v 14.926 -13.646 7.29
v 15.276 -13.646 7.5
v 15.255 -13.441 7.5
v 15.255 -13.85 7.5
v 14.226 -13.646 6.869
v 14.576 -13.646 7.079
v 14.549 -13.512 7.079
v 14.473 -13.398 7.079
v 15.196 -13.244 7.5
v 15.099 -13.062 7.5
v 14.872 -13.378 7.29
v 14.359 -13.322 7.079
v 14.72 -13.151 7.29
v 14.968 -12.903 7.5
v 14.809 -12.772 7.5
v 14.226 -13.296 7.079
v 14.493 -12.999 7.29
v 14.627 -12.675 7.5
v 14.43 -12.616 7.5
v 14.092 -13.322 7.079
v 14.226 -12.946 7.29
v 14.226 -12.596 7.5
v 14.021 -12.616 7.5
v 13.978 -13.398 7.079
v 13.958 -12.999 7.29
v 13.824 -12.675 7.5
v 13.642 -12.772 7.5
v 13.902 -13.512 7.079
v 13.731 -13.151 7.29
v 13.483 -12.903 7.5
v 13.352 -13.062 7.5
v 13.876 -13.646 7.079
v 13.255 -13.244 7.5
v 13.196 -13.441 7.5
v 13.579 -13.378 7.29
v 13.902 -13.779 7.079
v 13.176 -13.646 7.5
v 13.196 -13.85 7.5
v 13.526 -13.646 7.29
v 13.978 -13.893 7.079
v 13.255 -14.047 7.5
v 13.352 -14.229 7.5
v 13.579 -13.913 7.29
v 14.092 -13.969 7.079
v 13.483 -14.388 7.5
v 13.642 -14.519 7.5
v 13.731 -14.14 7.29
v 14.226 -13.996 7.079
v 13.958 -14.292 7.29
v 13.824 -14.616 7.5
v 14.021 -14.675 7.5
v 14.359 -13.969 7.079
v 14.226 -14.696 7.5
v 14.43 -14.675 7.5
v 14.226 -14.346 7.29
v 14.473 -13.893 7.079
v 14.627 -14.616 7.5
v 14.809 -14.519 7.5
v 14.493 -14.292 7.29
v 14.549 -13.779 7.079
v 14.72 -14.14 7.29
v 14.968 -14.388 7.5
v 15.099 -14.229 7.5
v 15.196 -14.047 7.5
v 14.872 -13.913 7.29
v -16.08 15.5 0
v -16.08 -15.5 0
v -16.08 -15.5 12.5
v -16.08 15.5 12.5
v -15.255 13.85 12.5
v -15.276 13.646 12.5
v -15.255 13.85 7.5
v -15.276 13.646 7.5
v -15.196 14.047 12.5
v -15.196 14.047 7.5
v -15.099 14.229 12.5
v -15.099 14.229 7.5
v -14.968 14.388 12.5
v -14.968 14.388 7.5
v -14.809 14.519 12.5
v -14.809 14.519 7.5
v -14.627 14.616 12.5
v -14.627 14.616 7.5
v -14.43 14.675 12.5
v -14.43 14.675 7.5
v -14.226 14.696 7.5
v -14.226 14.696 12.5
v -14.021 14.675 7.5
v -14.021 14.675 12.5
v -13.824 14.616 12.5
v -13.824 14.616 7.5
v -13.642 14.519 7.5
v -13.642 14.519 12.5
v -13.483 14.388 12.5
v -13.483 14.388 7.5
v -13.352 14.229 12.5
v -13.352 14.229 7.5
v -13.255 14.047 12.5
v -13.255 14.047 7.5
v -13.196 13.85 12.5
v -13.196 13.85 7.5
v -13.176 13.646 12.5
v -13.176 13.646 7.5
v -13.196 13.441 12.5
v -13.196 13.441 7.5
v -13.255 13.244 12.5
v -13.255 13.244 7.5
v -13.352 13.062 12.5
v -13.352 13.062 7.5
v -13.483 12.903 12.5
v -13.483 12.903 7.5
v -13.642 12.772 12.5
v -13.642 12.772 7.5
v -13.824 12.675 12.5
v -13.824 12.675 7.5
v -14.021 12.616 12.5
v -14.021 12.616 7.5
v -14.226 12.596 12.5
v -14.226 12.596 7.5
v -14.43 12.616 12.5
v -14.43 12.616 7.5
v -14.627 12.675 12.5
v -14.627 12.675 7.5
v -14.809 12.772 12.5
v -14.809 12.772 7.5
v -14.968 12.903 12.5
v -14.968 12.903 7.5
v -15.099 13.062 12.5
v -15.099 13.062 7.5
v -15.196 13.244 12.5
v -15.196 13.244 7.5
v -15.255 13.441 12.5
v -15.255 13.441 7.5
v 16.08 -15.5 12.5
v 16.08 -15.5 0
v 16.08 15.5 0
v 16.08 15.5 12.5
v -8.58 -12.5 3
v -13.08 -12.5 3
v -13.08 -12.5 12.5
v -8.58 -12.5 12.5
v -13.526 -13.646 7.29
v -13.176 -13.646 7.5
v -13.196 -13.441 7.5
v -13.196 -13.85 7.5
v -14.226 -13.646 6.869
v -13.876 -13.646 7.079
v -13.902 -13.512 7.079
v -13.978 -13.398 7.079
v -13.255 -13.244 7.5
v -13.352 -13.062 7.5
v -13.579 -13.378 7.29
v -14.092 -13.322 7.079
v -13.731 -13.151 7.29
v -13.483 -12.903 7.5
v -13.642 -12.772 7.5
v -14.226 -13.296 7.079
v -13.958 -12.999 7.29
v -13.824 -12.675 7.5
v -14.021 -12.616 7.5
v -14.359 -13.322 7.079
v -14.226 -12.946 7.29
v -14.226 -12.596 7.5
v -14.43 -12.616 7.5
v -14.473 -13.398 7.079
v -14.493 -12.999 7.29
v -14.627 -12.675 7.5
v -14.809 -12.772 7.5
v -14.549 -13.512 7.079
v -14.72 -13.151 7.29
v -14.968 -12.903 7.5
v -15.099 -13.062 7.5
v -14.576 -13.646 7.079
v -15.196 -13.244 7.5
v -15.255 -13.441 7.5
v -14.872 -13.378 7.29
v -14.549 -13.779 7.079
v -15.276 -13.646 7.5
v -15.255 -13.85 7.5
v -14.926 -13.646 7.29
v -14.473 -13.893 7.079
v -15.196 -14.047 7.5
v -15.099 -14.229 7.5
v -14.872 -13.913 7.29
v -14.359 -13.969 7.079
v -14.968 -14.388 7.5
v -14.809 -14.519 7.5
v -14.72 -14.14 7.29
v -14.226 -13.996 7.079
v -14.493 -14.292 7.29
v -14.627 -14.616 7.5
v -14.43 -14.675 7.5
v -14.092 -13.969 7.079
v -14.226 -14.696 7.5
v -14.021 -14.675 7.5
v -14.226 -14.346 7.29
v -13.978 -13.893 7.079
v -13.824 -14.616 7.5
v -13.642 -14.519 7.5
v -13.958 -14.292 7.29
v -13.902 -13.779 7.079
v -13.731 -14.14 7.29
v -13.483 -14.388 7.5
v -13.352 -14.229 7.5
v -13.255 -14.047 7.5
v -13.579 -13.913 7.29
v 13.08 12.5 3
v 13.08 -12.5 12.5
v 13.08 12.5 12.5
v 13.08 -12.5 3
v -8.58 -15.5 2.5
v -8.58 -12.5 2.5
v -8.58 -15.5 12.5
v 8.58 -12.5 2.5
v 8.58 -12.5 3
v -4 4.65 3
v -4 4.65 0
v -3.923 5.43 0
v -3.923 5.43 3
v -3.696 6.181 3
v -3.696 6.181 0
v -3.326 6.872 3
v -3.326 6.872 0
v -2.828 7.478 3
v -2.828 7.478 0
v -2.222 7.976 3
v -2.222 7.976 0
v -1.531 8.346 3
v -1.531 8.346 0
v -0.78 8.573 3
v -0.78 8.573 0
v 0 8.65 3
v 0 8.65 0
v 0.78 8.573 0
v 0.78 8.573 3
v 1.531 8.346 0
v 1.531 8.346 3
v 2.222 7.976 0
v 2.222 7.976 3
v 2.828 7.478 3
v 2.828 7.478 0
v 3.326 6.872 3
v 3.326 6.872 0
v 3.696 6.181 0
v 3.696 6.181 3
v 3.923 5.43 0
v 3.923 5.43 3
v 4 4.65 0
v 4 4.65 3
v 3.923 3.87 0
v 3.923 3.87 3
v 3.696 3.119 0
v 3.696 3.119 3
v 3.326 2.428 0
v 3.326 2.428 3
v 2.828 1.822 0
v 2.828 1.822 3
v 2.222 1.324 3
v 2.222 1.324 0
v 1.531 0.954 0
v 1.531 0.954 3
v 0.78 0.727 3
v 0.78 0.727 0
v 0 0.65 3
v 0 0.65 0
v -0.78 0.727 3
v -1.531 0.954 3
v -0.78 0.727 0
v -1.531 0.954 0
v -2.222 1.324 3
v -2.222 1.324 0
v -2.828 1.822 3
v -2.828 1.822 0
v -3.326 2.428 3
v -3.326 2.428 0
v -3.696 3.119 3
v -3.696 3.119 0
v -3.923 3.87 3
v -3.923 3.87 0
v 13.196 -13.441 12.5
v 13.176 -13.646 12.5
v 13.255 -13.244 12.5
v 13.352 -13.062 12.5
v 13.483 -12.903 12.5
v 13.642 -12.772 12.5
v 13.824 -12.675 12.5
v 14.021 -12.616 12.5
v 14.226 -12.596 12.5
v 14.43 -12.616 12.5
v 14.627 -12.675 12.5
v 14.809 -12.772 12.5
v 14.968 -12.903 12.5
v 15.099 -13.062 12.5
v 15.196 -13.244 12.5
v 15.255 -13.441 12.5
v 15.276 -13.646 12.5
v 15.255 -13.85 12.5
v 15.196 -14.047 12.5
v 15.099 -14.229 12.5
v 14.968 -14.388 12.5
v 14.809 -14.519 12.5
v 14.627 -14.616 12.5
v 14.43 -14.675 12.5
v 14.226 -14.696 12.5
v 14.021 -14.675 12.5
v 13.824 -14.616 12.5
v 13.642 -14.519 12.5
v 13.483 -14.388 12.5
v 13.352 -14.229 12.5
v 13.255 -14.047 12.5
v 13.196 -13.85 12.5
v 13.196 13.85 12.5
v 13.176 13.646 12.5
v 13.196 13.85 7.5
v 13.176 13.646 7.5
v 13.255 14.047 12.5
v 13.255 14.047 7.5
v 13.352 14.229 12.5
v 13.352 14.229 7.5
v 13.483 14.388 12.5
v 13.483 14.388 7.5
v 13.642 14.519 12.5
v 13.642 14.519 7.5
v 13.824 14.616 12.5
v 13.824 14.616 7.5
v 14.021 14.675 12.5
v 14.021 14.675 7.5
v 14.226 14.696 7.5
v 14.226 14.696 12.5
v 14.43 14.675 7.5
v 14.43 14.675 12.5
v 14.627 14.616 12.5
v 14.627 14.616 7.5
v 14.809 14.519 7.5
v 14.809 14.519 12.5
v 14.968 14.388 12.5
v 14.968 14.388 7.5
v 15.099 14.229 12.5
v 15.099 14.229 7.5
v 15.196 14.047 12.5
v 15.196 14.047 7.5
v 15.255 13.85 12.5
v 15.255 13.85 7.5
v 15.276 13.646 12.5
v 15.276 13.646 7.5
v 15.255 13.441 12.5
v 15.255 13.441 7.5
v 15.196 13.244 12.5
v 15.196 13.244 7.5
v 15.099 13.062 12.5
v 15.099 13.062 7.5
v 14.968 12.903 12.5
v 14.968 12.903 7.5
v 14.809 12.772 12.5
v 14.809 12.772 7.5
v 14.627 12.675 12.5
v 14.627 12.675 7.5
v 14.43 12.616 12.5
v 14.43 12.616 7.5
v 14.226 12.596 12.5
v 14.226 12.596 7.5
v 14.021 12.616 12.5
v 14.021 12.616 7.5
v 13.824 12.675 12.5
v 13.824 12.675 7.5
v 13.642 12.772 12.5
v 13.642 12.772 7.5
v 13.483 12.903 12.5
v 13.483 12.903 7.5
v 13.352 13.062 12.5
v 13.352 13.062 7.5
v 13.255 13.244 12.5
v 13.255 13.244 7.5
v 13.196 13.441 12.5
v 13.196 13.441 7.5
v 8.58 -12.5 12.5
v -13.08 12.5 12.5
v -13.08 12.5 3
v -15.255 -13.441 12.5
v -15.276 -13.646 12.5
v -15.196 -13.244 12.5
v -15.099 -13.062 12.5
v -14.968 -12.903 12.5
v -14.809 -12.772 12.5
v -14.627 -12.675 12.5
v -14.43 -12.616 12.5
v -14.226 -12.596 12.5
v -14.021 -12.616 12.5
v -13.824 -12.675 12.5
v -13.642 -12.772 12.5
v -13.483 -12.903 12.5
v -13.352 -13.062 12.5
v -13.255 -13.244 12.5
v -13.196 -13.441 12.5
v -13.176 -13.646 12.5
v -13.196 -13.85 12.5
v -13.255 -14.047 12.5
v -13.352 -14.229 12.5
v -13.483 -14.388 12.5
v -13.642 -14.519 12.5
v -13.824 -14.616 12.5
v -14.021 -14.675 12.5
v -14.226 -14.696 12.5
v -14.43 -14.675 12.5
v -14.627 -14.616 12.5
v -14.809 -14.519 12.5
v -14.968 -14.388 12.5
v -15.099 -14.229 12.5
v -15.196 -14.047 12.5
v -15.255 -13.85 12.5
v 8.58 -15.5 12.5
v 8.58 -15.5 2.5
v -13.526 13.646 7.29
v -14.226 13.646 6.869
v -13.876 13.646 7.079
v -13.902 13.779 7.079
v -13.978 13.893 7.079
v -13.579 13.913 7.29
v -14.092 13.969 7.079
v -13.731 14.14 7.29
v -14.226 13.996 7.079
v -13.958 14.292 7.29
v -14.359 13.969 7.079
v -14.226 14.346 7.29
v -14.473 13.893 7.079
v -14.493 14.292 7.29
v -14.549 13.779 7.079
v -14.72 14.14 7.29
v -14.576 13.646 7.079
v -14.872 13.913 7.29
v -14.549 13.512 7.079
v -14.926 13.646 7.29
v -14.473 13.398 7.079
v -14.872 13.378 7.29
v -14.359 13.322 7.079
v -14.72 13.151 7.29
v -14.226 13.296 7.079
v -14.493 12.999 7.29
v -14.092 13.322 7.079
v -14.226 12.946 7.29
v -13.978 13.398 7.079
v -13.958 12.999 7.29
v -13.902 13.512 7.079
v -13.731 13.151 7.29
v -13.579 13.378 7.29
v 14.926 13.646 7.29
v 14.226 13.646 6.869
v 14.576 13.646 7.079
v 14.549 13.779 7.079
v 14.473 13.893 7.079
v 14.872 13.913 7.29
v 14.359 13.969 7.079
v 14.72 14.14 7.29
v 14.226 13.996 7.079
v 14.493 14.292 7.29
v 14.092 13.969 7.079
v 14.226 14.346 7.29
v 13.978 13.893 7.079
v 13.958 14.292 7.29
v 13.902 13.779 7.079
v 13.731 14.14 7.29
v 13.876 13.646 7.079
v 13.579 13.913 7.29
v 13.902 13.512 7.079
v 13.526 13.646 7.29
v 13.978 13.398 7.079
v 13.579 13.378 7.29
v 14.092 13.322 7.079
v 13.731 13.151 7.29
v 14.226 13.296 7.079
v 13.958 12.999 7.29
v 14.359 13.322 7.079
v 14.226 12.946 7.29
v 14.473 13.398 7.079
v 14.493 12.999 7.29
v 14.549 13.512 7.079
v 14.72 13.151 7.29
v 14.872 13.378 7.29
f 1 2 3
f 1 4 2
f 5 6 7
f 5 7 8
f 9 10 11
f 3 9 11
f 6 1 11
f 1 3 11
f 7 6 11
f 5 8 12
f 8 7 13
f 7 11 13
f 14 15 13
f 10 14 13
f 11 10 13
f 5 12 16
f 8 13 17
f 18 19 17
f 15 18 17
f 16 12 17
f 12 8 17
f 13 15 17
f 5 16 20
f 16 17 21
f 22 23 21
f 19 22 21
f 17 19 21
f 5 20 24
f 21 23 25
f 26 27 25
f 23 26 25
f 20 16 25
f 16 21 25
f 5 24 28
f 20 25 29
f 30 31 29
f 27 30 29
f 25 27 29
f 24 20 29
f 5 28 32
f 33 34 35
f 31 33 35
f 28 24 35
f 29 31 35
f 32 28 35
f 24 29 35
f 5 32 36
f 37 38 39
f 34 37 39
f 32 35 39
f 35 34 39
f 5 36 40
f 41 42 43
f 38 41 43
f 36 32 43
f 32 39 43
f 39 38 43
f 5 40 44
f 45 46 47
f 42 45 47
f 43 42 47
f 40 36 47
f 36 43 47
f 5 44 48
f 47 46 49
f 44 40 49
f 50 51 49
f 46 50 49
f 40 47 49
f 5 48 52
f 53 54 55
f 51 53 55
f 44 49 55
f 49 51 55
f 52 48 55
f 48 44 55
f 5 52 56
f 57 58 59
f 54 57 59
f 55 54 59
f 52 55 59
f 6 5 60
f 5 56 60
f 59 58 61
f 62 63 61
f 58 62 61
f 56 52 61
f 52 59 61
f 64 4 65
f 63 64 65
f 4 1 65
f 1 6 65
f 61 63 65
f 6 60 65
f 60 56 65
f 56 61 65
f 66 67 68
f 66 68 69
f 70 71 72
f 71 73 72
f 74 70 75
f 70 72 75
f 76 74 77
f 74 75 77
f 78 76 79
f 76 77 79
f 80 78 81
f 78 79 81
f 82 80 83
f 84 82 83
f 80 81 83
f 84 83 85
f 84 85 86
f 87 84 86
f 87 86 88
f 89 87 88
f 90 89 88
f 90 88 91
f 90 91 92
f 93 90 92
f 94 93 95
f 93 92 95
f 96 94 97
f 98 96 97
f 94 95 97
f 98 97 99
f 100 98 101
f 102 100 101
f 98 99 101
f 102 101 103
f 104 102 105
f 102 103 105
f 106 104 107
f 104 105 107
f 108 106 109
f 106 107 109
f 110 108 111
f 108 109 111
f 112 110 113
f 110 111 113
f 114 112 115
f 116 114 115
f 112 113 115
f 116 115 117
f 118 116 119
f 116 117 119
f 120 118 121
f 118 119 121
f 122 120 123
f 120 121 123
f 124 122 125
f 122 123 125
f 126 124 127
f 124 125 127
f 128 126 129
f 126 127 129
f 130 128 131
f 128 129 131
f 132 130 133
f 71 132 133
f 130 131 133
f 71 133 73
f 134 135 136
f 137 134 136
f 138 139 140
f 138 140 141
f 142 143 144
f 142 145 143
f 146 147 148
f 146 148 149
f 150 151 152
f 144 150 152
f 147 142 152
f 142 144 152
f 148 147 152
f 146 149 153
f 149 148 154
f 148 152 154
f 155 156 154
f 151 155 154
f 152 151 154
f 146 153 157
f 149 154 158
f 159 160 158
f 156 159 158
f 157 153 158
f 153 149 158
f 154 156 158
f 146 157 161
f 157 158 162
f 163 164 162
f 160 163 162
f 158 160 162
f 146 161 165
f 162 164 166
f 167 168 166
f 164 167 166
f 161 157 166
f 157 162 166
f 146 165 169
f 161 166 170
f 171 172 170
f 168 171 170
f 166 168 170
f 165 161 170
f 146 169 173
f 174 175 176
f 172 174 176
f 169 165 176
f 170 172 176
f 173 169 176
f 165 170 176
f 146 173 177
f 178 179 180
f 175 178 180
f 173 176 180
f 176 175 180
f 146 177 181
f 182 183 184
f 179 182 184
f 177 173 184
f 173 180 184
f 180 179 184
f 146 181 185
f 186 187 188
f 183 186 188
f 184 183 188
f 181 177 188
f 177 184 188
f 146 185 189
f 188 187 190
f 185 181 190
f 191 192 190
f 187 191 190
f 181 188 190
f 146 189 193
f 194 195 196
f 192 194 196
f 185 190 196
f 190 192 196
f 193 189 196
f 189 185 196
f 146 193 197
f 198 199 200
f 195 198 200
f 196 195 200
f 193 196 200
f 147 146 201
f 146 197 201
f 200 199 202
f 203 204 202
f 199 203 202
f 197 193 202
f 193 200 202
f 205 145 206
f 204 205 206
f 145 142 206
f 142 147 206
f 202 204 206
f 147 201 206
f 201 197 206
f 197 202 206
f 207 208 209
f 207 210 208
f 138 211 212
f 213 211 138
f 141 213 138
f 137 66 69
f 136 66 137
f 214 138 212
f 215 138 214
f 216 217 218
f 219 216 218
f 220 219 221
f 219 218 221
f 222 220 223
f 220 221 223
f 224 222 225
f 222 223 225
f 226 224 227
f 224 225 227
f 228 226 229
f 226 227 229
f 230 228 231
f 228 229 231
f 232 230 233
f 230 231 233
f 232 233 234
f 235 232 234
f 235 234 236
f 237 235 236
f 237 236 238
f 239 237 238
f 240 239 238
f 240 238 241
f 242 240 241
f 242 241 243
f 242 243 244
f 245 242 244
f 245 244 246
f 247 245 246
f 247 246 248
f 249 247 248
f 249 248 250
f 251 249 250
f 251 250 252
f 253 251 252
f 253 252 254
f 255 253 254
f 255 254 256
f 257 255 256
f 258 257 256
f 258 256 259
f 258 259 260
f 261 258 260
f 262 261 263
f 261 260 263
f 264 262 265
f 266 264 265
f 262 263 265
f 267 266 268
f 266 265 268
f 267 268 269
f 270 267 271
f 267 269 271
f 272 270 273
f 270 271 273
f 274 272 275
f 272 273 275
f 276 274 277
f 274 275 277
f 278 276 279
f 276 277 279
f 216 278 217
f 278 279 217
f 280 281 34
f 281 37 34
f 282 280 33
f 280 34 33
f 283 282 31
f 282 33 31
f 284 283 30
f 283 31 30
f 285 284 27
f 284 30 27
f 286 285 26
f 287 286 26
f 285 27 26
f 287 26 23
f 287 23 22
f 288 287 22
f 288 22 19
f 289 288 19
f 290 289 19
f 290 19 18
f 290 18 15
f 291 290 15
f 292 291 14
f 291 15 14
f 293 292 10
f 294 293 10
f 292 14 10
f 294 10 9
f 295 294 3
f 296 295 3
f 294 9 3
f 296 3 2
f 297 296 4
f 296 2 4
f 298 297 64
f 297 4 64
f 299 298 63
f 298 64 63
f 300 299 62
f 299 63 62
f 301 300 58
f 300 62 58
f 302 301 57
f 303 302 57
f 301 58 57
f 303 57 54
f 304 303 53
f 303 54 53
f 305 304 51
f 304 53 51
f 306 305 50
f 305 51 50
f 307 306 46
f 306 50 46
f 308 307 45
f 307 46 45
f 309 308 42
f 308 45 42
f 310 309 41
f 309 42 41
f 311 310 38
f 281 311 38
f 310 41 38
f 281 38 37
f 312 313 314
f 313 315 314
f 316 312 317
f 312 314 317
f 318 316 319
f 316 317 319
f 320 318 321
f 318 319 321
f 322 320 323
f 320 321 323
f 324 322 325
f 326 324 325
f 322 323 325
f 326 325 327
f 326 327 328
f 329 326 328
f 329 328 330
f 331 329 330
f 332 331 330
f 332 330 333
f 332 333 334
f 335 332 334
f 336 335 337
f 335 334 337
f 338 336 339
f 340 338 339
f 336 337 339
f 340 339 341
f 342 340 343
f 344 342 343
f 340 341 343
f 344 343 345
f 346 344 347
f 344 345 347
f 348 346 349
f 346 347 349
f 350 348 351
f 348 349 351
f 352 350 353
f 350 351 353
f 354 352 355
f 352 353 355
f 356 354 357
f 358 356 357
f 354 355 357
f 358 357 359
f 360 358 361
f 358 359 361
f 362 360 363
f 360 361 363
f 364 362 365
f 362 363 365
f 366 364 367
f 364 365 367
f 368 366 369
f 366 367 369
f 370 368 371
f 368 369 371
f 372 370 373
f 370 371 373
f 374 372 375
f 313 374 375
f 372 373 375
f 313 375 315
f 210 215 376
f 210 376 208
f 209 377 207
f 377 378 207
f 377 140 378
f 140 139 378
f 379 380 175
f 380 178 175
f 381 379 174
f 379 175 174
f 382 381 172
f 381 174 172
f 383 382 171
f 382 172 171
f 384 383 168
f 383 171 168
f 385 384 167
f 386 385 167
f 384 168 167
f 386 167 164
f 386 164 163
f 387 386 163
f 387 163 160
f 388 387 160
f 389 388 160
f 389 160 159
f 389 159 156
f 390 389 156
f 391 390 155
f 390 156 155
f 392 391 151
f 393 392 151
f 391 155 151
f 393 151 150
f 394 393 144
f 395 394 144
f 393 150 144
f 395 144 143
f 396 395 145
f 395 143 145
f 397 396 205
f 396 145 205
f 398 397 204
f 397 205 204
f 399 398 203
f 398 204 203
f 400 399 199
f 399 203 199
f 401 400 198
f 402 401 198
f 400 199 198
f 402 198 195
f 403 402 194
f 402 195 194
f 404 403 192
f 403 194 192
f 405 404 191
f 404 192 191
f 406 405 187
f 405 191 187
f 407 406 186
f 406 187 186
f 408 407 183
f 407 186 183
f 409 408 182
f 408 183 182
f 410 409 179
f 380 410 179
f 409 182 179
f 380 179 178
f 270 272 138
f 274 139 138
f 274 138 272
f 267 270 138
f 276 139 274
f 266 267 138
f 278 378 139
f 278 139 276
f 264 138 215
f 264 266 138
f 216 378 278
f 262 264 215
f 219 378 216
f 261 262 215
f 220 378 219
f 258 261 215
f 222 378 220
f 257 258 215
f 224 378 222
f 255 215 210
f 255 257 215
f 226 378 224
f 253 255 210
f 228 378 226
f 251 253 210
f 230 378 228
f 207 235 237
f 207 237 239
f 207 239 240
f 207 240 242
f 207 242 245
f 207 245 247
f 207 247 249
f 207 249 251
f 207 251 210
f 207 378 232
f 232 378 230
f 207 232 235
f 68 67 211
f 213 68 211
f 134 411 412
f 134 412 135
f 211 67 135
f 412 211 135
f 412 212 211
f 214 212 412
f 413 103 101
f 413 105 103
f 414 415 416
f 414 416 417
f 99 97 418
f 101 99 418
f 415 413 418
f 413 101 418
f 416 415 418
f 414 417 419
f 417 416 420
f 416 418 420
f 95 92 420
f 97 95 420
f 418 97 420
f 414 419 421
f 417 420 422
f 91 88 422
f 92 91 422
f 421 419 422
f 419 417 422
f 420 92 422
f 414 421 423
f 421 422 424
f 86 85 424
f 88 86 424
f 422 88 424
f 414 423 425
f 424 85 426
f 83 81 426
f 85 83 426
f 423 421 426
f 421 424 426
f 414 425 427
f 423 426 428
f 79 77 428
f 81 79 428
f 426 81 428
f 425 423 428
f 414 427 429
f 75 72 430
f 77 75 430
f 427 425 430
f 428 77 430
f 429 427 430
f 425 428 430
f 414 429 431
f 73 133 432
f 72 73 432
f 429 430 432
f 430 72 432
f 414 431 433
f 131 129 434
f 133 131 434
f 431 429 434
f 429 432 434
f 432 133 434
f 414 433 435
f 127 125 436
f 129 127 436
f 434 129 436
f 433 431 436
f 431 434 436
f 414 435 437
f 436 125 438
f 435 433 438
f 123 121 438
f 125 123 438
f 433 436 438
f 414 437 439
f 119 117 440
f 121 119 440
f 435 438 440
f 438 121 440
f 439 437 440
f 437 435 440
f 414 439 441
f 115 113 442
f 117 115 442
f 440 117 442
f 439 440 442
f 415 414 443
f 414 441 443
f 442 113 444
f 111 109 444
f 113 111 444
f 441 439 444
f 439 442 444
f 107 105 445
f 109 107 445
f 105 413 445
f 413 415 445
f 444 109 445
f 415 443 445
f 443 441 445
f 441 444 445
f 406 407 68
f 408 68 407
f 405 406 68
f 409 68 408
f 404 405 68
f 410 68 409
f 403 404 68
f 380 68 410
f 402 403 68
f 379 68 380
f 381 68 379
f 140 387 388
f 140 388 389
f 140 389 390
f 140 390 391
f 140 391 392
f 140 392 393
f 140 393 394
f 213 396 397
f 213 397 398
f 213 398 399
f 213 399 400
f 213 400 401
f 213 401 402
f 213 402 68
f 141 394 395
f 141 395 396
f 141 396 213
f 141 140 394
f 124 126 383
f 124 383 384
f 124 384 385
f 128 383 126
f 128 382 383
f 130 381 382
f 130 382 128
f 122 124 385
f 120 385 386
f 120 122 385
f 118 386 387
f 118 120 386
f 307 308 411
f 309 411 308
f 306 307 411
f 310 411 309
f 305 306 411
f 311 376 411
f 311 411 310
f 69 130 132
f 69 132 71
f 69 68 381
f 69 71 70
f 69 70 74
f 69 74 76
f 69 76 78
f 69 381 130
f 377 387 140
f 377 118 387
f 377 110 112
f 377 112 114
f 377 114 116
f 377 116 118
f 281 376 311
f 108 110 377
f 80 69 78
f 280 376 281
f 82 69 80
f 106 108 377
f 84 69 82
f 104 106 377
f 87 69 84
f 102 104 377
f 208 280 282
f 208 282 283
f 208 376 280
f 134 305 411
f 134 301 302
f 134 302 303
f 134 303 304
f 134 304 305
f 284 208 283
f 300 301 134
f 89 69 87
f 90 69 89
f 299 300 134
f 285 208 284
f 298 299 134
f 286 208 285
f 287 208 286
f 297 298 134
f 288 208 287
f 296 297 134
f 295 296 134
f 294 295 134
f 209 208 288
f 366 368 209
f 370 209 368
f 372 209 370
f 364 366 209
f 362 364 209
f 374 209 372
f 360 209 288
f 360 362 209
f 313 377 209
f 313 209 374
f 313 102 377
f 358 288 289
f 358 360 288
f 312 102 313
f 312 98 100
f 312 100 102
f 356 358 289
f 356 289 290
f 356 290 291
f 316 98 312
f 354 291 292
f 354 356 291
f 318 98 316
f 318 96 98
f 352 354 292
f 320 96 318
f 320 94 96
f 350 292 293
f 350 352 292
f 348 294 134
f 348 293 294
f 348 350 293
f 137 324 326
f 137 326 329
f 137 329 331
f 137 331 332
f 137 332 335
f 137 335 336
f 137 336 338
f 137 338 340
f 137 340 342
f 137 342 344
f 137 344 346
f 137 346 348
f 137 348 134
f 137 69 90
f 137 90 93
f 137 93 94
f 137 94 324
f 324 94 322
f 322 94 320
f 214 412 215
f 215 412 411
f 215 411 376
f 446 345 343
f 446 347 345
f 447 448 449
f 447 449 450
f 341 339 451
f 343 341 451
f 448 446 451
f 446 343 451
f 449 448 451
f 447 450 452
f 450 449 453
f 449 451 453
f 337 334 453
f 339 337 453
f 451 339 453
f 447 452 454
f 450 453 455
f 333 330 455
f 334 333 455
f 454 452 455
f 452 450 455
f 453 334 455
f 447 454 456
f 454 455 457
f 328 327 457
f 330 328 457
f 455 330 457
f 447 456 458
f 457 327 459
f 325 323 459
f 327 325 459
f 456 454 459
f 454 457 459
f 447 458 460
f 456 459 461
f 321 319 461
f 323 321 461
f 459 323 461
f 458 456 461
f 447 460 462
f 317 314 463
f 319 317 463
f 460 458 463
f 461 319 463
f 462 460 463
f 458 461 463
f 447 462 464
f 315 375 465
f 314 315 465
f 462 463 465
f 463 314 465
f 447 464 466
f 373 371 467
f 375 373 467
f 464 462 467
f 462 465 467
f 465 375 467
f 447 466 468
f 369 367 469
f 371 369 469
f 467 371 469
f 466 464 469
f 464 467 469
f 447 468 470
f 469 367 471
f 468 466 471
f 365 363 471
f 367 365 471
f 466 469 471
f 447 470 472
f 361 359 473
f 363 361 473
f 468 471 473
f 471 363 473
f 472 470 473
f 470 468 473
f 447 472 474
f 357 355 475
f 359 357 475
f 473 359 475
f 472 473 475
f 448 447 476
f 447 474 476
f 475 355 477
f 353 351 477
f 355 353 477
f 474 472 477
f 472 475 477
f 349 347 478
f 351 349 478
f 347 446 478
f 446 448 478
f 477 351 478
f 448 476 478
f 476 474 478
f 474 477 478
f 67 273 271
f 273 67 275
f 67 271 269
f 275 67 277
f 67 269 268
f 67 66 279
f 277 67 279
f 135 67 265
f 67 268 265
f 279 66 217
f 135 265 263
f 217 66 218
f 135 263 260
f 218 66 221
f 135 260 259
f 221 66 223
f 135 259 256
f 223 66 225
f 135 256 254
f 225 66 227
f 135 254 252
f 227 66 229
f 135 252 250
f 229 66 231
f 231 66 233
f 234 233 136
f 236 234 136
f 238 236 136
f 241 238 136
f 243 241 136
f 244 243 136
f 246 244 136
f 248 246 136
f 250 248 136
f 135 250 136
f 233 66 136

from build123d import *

# Parameters (mm, degrees)
F0_W     = 32.16
F0_H     = 31
F1_DEPTH = 12.5
F2_T     = -3
F3_W     = 17.16
F3_H     = 3
F4_DEPTH = 10
F6_D     = 8
F6_DEPTH = 5
F6_TIP   = 2.4034424761
F8_D     = 2.1
F8_DEPTH = 5
F8_TIP   = 0.63090365


with BuildPart() as f1:
    # F0 (on Top) → F1 (new body)
    with BuildSketch(Plane.XY):
        Rectangle(F0_W, F0_H)
    extrude(amount=F1_DEPTH)

    # F2
    f2_openings = [f1.faces().sort_by_distance(p)[0] for p in [
        (0, 0, 12.5),
    ]]
    offset(amount=F2_T, openings=f2_openings)

    # F3 (on face) → F4 (cut)
    with BuildSketch(Plane.XY.offset(12.5)):
        with Locations((0, -14)):
            Rectangle(F3_W, F3_H)
    extrude(amount=-F4_DEPTH, mode=Mode.SUBTRACT)

    # F6
    with Locations(Plane.XY.offset(3)):
        with Locations((0, 4.65)):
            Hole(F6_D / 2, depth=F6_DEPTH)
            with Locations((0, 0, -(F6_DEPTH + F6_TIP / 2))):  # 118° drill point
                Cone(0, F6_D / 2, F6_TIP, mode=Mode.SUBTRACT)

    # F8
    with Locations(Plane.XY.offset(12.5)):
        with Locations((-14.2255129855, -13.6455129855), (14.2255129855, -13.6455129855), (14.2255129855, 13.6455129855), (-14.2255129855, 13.6455129855)):
            Hole(F8_D / 2, depth=F8_DEPTH)
            with Locations((0, 0, -(F8_DEPTH + F8_TIP / 2))):  # 118° drill point
                Cone(0, F8_D / 2, F8_TIP, mode=Mode.SUBTRACT)


solid = f1.part
